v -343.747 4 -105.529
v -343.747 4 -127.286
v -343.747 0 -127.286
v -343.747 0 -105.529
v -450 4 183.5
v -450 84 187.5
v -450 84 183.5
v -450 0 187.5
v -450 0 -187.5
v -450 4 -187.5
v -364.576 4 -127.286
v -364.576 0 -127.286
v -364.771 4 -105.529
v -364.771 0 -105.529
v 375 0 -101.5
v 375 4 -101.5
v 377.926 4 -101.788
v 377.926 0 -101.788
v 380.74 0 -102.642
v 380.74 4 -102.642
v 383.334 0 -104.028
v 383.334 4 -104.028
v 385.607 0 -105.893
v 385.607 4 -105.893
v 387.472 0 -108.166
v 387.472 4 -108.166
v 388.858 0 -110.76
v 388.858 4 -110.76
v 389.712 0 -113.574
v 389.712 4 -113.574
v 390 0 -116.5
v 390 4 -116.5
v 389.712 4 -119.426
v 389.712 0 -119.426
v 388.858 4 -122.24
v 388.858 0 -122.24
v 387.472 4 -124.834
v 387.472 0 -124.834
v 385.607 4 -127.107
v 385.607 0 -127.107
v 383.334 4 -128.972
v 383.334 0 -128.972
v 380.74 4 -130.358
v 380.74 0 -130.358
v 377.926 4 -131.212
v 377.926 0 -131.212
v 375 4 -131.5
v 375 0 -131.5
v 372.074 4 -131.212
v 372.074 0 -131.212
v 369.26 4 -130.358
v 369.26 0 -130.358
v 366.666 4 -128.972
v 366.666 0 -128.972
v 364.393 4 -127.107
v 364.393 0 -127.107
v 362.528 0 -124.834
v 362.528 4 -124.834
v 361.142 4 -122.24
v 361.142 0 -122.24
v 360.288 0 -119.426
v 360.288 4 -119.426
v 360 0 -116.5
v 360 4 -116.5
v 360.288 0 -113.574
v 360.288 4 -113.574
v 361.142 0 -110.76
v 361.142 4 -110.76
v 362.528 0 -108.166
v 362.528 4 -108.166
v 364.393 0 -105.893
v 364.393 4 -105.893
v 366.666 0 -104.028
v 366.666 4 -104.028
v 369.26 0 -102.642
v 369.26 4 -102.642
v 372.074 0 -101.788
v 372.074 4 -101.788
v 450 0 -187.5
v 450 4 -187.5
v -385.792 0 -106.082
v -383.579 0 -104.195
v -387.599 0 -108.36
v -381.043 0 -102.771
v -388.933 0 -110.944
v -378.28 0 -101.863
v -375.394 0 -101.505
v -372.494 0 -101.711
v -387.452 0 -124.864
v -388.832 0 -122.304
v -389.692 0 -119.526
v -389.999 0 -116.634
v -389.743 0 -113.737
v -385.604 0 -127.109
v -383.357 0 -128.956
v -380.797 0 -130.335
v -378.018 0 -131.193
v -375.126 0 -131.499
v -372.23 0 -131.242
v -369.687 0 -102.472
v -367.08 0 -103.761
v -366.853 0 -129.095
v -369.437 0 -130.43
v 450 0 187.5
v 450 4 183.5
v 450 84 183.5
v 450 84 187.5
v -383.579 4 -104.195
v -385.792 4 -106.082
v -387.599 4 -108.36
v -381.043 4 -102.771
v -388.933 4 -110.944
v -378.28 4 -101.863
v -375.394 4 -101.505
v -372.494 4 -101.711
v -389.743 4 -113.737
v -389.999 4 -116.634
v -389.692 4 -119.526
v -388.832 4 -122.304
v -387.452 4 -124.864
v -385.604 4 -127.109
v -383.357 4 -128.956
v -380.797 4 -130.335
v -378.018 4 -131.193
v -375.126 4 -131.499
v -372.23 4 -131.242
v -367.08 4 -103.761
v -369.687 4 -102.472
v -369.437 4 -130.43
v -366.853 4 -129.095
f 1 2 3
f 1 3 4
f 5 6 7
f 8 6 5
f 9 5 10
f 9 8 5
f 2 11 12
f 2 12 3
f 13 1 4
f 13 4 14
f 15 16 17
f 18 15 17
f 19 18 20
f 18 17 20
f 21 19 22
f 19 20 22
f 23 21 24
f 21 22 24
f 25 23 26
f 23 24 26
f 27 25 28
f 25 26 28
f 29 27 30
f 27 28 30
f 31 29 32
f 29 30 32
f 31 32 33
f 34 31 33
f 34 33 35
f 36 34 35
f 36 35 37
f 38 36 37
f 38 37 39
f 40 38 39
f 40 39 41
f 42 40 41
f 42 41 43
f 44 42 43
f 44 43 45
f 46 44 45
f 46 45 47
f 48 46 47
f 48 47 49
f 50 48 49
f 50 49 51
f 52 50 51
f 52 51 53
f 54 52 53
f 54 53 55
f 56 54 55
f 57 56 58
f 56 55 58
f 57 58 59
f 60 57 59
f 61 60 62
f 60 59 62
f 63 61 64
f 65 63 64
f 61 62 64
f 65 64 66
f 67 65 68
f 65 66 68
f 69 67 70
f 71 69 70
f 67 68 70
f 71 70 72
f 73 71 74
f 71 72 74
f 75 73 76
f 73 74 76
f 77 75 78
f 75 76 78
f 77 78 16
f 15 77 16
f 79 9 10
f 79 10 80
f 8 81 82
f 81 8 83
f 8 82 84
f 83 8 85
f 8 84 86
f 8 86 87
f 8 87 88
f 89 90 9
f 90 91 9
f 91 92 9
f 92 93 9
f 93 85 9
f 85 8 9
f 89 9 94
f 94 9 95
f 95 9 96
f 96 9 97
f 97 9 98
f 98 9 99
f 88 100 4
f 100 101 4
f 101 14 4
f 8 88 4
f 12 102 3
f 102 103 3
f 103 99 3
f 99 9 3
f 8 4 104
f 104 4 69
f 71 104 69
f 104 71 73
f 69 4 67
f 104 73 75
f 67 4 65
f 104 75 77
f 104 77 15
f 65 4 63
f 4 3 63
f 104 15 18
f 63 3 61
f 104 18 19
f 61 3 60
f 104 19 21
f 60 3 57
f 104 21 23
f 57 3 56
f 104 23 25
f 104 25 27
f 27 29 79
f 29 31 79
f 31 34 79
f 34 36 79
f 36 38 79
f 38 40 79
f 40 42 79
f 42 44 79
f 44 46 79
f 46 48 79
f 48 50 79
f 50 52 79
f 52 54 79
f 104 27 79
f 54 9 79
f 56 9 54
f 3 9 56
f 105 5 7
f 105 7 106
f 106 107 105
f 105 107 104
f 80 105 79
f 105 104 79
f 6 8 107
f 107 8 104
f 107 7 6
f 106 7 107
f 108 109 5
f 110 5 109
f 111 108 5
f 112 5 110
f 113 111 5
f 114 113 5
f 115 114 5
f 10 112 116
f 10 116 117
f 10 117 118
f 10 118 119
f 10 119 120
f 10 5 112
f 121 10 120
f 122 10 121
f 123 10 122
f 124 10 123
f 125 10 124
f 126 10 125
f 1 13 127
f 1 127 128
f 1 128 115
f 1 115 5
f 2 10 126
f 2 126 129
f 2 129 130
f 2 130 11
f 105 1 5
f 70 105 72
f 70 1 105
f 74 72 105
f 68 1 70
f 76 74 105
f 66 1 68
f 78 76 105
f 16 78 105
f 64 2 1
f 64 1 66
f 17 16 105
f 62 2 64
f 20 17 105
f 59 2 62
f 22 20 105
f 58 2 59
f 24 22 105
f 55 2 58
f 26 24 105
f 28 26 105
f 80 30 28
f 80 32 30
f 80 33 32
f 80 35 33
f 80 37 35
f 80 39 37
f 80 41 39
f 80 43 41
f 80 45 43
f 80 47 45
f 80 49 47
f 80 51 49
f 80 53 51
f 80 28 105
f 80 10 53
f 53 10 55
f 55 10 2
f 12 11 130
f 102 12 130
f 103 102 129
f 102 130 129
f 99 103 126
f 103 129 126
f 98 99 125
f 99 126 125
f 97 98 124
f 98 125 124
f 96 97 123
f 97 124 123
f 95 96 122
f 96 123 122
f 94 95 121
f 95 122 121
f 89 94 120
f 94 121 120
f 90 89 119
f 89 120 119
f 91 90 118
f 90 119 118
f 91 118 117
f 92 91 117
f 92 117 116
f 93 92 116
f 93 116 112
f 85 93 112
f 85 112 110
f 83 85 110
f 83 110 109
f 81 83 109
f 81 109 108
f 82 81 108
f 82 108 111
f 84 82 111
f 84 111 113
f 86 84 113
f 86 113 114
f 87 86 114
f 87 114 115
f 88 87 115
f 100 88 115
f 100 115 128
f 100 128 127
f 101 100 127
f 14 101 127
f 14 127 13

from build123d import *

# Parameters (mm, degrees)
SKETCH1_W           = 900
SKETCH1_H           = 375
BOSS_EXTRUDE1_DEPTH = 4
SKETCH2_W           = 900
SKETCH2_H           = 4
BOSS_EXTRUDE2_DEPTH = 80
SKETCH3_R           = 15
CUT_EXTRUDE1_DEPTH  = 80
CUT_EXTRUDE2_DEPTH  = 48


with BuildPart() as part:
    # Sketch1 → Boss-Extrude1 (new body)
    with BuildSketch(Plane(origin=(0, 0, 0), x_dir=(1, 0, 0), z_dir=(0, 1, 0))):
        Rectangle(SKETCH1_W, SKETCH1_H)
    extrude(amount=BOSS_EXTRUDE1_DEPTH)

    # Sketch2 → Boss-Extrude2 (add)
    with BuildSketch(Plane(origin=(0, 4, 0), x_dir=(1, 0, 0), z_dir=(0, 1, 0))):
        with Locations((0, -185.5)):
            Rectangle(SKETCH2_W, SKETCH2_H)
    extrude(amount=BOSS_EXTRUDE2_DEPTH)

    # Sketch3 → Cut-Extrude1 (cut)
    with BuildSketch(Plane(origin=(0, 4, 0), x_dir=(1, 0, 0), z_dir=(0, 1, 0))):
        with Locations(Location((375, 116.5, 0), (0, 0, 270))):
            Circle(SKETCH3_R)
        with Locations(Location((-375, 116.5, 0), (0, 0, 270))):
            Circle(SKETCH3_R)
    extrude(amount=-CUT_EXTRUDE1_DEPTH, mode=Mode.SUBTRACT)

    # Sketch6 → Cut-Extrude2 (cut)
    with BuildSketch(Plane(origin=(0, 30, 0), x_dir=(-1, 0, 0), z_dir=(0, -1, 0))):
        Polygon((375.476662109, 116.274639687), (375.476662109, 127.286348112), (343.747335513, 127.286348112), (343.747335513, 105.528943218), (375.476662109, 105.528943218), align=None)
    extrude(amount=CUT_EXTRUDE2_DEPTH, mode=Mode.SUBTRACT)


solid = part.part
